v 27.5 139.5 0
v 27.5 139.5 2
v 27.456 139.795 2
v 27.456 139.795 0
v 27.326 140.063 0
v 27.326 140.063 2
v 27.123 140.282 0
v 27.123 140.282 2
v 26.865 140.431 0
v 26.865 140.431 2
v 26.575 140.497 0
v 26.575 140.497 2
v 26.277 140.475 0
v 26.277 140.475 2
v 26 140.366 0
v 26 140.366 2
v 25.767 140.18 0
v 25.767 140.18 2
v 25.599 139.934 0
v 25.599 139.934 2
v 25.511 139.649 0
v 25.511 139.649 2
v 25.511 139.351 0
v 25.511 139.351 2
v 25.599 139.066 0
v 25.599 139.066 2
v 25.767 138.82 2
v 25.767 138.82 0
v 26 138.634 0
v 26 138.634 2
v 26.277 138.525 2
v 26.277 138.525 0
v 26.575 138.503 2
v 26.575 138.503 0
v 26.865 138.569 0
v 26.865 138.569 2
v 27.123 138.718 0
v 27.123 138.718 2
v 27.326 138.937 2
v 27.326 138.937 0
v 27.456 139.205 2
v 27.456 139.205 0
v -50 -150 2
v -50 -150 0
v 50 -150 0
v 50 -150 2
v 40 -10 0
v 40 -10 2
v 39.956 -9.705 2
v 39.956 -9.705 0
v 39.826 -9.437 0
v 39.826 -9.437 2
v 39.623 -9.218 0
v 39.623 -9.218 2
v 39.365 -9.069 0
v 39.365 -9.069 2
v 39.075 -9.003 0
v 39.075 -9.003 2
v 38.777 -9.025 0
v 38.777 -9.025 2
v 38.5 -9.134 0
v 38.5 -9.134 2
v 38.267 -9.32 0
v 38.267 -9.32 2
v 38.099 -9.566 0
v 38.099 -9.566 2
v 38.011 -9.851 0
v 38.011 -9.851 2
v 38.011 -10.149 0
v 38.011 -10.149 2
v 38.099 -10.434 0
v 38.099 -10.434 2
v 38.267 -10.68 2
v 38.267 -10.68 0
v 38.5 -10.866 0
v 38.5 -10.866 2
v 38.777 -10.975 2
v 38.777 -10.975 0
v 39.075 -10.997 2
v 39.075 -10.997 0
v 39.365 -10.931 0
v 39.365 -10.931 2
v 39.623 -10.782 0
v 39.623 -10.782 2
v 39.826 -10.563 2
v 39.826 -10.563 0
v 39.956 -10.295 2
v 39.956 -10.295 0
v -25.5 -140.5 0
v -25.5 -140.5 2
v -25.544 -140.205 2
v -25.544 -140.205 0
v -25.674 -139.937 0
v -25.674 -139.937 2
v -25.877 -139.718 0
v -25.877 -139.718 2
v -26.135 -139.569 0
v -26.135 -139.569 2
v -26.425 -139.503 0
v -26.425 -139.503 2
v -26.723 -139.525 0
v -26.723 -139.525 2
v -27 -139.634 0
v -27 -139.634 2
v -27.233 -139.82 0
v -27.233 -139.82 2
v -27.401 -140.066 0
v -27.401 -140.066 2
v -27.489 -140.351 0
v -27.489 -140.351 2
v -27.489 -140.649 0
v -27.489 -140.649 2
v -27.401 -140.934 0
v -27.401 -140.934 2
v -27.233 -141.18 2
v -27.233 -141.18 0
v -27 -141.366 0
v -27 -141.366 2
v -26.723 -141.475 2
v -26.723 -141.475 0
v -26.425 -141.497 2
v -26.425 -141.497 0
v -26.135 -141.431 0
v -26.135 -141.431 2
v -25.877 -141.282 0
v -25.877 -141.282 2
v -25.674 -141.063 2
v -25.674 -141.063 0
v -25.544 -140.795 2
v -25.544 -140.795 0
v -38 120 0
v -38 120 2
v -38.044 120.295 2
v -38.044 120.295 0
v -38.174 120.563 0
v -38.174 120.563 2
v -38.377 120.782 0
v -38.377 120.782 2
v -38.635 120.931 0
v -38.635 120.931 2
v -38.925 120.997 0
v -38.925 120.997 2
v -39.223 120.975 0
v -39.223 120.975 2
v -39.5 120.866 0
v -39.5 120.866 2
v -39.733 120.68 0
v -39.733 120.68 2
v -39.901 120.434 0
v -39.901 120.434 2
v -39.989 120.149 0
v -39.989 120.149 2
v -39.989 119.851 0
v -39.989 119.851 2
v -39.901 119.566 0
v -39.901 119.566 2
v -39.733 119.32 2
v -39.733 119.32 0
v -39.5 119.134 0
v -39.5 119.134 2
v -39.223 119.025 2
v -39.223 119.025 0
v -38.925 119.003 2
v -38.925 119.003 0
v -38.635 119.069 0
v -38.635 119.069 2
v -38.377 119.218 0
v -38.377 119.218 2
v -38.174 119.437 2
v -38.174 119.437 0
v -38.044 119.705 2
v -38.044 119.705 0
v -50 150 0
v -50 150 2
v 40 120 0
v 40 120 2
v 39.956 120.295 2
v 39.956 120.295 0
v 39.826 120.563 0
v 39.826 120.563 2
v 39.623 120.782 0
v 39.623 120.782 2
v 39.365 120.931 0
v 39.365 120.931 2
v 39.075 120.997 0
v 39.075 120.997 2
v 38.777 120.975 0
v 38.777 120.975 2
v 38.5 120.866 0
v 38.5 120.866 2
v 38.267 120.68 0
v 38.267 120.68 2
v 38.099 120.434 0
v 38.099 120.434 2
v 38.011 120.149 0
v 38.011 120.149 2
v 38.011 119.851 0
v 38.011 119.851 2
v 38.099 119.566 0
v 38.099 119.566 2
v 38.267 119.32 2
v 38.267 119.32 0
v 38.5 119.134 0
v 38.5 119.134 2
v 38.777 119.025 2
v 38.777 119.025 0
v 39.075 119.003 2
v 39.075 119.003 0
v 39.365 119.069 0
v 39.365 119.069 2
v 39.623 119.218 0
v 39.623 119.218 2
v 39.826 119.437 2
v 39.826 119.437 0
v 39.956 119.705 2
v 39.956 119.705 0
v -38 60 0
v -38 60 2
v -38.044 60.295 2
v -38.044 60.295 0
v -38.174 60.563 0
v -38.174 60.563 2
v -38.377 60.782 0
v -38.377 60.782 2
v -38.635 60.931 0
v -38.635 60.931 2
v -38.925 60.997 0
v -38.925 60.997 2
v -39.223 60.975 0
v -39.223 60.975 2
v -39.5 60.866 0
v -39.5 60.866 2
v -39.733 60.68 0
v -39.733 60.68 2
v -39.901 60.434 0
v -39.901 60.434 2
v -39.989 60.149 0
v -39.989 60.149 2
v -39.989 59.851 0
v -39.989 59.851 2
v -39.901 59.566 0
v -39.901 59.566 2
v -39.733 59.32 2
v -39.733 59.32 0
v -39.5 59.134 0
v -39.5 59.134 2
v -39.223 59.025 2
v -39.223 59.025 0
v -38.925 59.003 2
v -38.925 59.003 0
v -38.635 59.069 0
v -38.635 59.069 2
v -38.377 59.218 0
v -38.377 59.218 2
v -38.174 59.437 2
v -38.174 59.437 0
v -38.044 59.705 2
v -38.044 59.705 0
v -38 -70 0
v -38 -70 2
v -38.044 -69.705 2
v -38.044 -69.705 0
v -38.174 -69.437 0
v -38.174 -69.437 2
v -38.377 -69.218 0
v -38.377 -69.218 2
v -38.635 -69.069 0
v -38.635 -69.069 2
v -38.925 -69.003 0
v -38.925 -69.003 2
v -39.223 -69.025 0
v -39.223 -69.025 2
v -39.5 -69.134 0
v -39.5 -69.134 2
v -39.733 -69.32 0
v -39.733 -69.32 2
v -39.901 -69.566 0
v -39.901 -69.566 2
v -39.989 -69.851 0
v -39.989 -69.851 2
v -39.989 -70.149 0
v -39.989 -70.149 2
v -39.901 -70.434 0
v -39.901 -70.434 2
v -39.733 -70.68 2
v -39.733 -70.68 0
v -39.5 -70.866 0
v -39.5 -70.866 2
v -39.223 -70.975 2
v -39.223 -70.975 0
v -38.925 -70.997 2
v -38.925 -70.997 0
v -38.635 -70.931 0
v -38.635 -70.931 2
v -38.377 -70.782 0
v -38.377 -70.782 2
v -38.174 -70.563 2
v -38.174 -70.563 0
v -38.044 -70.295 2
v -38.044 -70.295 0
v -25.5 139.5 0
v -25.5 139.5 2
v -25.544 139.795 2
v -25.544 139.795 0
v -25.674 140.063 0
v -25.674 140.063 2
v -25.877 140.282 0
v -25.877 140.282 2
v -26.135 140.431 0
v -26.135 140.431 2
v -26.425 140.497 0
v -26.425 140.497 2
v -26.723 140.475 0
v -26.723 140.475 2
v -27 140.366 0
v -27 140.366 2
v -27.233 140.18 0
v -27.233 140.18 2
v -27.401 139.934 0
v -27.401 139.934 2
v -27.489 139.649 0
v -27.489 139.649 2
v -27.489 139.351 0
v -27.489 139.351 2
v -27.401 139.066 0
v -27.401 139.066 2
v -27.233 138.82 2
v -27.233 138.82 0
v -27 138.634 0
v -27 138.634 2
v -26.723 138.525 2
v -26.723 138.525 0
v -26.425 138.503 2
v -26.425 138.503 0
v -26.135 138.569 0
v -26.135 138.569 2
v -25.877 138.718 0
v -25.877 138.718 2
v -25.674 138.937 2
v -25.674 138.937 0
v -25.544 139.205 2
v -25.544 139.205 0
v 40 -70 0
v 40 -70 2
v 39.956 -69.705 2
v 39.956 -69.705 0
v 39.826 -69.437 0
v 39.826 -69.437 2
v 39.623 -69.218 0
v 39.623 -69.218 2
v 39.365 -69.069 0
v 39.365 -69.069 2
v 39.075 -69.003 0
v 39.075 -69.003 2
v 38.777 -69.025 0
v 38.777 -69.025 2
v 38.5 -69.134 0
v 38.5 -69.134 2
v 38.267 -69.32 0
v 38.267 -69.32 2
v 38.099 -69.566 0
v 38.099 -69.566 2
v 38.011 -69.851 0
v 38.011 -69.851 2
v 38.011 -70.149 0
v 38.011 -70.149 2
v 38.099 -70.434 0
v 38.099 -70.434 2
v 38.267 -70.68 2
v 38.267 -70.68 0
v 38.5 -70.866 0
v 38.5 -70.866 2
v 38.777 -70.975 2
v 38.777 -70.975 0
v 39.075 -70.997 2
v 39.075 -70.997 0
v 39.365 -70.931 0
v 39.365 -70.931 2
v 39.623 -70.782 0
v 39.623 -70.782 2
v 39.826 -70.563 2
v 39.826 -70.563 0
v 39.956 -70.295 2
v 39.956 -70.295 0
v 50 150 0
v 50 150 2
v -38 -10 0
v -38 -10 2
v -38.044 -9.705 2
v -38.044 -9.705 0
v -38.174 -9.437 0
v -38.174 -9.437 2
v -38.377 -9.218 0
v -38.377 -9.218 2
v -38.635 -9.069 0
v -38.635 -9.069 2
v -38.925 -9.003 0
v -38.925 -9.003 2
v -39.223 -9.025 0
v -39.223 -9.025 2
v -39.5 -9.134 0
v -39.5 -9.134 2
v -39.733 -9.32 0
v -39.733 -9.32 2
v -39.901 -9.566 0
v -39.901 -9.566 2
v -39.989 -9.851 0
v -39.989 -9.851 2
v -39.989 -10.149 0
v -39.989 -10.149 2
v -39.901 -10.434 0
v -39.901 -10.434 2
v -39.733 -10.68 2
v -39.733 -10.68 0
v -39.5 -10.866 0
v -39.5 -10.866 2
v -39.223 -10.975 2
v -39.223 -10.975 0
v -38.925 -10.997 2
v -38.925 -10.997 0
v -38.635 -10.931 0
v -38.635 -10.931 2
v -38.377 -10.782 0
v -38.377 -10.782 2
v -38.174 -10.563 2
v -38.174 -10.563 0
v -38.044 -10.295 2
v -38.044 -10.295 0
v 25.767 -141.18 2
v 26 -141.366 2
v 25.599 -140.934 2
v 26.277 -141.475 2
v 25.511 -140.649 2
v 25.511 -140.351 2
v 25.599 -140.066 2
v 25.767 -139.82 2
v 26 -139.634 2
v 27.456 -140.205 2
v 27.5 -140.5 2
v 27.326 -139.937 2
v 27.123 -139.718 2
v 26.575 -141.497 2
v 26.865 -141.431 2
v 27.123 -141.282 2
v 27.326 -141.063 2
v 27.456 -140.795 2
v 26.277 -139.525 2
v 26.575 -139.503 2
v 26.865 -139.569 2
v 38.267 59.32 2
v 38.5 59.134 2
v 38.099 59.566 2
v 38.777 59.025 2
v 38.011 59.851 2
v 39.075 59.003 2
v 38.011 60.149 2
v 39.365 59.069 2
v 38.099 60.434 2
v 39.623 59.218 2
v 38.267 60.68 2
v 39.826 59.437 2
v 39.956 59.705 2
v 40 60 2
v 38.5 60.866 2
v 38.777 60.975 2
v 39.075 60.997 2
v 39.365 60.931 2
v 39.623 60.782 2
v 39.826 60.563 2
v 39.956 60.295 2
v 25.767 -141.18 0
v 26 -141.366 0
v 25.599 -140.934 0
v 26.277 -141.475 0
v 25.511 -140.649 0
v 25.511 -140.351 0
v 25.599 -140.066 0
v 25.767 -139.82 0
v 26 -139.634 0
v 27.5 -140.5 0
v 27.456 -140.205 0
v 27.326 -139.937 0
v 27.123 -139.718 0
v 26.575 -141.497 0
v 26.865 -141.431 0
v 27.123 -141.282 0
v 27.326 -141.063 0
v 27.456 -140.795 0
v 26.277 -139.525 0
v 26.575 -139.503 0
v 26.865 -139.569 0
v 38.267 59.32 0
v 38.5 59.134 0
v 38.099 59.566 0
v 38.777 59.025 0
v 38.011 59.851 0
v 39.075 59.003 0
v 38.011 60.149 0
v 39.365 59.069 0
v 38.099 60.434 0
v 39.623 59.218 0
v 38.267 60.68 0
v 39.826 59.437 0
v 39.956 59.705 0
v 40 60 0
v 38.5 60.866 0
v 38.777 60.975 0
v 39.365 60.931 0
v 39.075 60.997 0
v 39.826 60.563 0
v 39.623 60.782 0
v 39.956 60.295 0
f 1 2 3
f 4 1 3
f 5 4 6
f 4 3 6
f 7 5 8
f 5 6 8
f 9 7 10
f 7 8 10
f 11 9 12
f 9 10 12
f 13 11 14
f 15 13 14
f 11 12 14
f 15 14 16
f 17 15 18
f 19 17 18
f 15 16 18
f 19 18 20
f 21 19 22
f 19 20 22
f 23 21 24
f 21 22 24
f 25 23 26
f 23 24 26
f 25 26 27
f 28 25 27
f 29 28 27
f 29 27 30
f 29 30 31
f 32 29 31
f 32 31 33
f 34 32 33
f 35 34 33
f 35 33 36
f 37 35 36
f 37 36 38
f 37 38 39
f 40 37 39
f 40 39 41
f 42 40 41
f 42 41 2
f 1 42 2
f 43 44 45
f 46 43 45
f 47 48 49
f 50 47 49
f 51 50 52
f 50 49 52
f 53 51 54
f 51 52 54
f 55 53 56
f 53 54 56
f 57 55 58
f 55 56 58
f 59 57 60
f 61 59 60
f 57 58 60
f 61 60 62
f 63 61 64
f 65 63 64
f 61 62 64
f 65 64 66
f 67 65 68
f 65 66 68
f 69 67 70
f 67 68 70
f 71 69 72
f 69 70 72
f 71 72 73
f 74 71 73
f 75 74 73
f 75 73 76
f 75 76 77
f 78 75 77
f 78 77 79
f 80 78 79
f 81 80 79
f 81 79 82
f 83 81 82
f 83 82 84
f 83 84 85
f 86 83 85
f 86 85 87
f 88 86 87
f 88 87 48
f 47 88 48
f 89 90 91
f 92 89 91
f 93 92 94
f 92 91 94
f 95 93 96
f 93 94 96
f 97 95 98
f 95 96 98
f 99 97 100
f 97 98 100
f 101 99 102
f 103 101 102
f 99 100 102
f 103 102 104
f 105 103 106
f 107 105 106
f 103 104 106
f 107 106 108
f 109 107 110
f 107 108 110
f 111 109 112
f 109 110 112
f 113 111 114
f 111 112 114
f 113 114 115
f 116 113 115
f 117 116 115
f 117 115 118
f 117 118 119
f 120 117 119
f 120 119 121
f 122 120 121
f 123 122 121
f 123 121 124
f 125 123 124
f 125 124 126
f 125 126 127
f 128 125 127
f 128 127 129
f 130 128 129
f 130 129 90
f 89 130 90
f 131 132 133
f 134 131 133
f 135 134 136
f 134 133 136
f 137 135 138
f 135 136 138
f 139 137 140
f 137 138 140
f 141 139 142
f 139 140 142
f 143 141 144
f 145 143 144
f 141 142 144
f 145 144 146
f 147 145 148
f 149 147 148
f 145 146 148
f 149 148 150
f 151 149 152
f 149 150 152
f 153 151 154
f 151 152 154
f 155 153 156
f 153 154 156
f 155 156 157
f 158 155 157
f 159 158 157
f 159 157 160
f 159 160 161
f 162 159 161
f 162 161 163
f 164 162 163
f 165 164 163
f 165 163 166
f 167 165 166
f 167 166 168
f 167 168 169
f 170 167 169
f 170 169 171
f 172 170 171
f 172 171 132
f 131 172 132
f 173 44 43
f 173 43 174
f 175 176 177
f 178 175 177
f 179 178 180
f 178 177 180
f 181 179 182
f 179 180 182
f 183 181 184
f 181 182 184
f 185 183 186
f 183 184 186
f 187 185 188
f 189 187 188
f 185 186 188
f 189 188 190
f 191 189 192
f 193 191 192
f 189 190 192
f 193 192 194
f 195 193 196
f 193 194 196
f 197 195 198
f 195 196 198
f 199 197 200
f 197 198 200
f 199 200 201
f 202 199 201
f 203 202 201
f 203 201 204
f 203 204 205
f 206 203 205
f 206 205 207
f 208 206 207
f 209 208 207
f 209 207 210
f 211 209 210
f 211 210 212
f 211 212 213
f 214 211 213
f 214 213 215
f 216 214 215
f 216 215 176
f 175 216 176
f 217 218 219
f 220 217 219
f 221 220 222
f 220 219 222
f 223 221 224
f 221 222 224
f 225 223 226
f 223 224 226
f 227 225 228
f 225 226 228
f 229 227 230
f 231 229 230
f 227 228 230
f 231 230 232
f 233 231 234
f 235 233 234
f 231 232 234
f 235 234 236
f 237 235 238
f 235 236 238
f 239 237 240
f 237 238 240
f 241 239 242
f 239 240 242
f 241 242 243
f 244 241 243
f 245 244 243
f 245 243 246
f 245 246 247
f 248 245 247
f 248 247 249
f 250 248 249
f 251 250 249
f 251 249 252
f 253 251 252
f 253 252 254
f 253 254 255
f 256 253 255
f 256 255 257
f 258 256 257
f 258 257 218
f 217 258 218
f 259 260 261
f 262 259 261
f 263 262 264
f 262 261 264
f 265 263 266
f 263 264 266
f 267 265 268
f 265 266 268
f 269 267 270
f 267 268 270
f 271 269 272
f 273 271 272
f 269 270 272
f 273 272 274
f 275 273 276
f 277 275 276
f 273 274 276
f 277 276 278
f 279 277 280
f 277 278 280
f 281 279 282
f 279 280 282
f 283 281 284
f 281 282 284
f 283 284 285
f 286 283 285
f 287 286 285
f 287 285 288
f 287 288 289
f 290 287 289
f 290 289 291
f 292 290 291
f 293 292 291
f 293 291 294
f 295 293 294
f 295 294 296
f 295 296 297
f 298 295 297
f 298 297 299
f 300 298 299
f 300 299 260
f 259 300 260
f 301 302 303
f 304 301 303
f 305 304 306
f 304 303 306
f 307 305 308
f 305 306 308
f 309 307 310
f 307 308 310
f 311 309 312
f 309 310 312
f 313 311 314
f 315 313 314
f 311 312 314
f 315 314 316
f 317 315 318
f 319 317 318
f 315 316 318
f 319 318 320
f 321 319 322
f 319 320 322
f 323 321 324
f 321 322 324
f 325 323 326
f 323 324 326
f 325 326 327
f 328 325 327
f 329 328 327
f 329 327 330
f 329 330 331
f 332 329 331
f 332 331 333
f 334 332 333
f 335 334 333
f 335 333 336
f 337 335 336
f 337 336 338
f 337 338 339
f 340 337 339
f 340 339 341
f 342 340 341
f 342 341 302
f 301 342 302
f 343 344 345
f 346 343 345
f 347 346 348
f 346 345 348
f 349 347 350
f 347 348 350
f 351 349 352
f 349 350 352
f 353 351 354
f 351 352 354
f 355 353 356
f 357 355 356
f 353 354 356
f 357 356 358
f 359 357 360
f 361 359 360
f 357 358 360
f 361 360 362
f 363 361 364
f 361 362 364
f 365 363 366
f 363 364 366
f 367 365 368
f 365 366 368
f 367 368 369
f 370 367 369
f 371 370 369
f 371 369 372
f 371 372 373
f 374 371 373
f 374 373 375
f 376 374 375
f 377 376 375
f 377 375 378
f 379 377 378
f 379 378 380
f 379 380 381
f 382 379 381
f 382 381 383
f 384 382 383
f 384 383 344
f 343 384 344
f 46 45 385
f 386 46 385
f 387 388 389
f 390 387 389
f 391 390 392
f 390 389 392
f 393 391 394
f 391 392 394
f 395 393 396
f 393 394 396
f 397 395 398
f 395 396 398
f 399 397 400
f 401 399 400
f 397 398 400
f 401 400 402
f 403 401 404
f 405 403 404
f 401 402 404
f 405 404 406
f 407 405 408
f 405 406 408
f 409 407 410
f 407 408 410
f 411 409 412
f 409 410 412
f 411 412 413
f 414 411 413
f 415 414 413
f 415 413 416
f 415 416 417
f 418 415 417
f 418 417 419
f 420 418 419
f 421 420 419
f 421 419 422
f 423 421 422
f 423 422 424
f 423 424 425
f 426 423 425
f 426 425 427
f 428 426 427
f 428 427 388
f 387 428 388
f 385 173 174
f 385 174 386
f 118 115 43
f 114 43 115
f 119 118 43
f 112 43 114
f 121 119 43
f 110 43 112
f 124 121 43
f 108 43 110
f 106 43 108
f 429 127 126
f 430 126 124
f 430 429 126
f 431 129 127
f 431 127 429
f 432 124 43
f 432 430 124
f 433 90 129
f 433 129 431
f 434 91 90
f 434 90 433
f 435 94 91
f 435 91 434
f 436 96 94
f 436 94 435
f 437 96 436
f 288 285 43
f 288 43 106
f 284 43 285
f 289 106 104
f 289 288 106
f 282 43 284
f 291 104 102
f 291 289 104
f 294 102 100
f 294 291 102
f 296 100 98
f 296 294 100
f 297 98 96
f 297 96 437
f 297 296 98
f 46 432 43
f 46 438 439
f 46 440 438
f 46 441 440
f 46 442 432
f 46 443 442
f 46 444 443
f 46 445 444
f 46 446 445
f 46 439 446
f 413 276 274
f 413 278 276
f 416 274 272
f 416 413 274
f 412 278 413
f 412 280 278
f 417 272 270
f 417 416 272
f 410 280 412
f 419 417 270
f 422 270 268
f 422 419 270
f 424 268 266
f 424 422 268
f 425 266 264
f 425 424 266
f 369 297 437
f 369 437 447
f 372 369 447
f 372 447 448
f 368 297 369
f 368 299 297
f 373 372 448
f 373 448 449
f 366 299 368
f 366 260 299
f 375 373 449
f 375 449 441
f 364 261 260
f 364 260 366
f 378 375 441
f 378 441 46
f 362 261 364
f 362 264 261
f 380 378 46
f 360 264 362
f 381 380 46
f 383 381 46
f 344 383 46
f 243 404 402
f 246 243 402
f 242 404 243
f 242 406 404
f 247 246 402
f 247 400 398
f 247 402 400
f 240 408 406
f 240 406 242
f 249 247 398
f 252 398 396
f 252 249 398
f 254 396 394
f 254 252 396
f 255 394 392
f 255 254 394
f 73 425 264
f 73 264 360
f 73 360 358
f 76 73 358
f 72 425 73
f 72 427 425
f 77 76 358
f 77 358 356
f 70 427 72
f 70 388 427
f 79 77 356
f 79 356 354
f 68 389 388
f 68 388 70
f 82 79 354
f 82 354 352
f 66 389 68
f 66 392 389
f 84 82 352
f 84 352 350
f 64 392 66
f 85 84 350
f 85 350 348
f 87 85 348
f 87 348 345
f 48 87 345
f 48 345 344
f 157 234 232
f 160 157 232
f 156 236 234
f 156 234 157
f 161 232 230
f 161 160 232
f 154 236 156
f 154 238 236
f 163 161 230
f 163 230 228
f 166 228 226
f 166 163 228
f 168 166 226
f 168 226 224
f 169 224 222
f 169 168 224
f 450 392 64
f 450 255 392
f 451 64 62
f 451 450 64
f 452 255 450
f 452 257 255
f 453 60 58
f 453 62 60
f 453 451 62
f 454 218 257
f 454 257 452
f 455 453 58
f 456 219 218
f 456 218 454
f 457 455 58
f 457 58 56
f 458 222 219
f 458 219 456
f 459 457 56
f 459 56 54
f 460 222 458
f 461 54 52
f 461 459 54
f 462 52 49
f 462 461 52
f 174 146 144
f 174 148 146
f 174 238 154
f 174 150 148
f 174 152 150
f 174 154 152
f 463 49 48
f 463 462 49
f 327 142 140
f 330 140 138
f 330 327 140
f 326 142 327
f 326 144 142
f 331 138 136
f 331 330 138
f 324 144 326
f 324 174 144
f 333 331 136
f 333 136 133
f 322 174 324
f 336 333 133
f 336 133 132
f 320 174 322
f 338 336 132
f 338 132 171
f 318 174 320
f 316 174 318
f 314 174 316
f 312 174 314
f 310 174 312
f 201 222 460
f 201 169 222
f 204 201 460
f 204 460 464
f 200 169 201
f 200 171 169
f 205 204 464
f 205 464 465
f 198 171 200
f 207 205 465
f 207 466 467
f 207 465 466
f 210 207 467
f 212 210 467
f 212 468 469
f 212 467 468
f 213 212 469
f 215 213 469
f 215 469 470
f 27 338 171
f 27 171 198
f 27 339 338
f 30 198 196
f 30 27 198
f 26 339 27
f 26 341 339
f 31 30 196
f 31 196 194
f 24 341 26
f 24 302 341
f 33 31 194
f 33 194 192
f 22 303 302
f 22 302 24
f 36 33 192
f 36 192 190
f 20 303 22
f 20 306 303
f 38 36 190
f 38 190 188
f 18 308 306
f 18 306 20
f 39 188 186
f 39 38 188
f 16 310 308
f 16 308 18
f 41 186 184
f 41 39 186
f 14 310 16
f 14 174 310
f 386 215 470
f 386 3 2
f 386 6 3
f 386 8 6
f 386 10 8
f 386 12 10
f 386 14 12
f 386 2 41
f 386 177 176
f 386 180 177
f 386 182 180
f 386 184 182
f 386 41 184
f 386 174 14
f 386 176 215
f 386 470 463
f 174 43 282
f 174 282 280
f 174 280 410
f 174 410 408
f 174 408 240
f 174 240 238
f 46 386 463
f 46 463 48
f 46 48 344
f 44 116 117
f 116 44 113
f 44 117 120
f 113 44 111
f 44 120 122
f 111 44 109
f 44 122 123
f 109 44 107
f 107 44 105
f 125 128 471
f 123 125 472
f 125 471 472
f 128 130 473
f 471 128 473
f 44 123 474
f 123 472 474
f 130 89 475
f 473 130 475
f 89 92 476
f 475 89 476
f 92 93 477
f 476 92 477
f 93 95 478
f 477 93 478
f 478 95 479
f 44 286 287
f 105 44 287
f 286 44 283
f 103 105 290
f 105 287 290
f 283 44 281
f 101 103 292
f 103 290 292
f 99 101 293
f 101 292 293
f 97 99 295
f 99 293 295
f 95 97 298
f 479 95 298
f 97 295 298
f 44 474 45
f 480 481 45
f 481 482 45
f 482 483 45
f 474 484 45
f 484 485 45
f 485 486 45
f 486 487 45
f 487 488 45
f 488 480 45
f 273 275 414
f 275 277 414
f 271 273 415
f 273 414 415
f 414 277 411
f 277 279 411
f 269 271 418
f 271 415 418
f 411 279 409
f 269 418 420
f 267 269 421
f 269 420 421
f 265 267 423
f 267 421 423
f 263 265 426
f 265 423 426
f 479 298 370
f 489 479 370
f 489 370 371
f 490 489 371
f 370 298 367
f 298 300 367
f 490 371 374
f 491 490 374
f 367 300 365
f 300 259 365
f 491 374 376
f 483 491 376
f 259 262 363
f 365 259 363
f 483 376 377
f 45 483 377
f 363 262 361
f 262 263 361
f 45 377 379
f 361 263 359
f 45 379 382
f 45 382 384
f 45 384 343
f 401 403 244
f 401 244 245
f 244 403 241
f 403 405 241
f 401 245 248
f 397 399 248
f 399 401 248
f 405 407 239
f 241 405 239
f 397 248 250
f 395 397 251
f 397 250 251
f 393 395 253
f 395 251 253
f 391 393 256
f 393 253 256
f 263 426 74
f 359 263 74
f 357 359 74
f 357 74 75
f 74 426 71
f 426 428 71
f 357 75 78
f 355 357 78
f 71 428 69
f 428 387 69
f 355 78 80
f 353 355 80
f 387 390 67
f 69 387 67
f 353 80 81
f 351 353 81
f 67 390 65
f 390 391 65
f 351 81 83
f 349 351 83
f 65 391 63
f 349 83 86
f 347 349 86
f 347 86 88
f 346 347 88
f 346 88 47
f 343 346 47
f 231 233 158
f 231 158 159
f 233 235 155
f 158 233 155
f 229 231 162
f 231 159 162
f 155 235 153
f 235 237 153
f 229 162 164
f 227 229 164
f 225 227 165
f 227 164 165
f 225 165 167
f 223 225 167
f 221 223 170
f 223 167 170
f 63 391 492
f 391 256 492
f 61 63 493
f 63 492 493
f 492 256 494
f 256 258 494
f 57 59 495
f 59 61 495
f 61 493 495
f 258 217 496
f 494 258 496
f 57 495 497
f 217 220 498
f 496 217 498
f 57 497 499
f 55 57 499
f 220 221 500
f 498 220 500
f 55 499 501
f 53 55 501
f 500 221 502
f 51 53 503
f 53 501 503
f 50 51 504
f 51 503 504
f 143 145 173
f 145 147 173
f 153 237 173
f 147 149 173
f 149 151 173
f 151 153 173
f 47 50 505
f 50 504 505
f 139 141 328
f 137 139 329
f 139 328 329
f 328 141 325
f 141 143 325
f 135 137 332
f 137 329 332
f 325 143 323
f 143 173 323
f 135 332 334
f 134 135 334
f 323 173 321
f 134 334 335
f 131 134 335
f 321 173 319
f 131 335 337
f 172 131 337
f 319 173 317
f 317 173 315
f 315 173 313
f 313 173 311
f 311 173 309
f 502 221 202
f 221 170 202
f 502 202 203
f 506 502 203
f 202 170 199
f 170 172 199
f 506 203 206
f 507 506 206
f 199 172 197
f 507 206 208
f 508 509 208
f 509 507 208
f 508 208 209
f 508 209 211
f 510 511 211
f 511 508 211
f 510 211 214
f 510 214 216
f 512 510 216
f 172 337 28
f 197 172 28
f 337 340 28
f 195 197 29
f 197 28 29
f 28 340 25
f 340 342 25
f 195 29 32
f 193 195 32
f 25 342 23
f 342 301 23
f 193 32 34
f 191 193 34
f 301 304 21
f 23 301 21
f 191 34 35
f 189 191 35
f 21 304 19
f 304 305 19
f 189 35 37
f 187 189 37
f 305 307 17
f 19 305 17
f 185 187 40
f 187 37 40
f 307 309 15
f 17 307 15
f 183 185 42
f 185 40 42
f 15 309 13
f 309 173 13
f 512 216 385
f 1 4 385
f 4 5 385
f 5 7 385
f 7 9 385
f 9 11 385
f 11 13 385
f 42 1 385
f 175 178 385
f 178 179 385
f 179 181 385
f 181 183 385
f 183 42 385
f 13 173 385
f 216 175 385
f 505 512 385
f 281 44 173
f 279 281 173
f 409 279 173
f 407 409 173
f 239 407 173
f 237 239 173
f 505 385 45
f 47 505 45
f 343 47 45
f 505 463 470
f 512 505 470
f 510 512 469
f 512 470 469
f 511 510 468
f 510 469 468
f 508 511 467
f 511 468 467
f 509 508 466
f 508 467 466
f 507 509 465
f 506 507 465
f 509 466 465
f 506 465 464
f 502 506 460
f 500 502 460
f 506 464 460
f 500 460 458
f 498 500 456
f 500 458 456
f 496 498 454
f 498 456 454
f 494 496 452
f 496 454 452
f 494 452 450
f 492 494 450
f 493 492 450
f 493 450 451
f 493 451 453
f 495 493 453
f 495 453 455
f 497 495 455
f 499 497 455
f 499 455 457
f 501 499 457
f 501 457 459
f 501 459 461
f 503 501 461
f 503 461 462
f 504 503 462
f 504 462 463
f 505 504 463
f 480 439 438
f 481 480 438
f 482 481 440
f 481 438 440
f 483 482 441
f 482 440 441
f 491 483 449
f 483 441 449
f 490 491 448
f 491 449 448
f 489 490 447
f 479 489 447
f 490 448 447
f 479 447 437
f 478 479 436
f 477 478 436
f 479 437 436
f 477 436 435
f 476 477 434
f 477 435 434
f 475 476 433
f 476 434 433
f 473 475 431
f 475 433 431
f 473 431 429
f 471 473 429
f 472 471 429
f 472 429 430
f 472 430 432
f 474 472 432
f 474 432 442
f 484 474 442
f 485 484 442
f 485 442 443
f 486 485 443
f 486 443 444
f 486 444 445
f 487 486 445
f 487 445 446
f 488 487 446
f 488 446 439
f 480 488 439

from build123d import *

# Parameters (mm, degrees)
SKETCH1_W           = 100
SKETCH1_H           = 300
BOSS_EXTRUDE1_DEPTH = 2
SKETCH2_R           = 1
CUT_EXTRUDE1_DEPTH  = 10
SKETCH3_R           = 1
CUT_EXTRUDE2_DEPTH  = 10


with BuildPart() as part:
    # Sketch1 → Boss-Extrude1 (new body)
    with BuildSketch(Plane.XY):
        Rectangle(SKETCH1_W, SKETCH1_H)
    extrude(amount=BOSS_EXTRUDE1_DEPTH)

    # Sketch2 → Cut-Extrude1 (cut)
    with BuildSketch(Plane.XY.offset(2)):
        with Locations((-39, 120)):
            Circle(SKETCH2_R)
        with Locations((-39, 60)):
            Circle(SKETCH2_R)
        with Locations((-39, -10)):
            Circle(SKETCH2_R)
        with Locations((-39, -70)):
            Circle(SKETCH2_R)
        with Locations((39, -70)):
            Circle(SKETCH2_R)
        with Locations((39, -10)):
            Circle(SKETCH2_R)
        with Locations((39, 60)):
            Circle(SKETCH2_R)
        with Locations((39, 120)):
            Circle(SKETCH2_R)
    extrude(amount=-CUT_EXTRUDE1_DEPTH, mode=Mode.SUBTRACT)

    # Sketch3 → Cut-Extrude2 (cut)
    with BuildSketch(Plane.XY.offset(2)):
        with Locations((-26.5, -140.5)):
            Circle(SKETCH3_R)
        with Locations((26.5, -140.5)):
            Circle(SKETCH3_R)
        with Locations((-26.5, 139.5)):
            Circle(SKETCH3_R)
        with Locations((26.5, 139.5)):
            Circle(SKETCH3_R)
    extrude(amount=-CUT_EXTRUDE2_DEPTH, mode=Mode.SUBTRACT)


solid = part.part
